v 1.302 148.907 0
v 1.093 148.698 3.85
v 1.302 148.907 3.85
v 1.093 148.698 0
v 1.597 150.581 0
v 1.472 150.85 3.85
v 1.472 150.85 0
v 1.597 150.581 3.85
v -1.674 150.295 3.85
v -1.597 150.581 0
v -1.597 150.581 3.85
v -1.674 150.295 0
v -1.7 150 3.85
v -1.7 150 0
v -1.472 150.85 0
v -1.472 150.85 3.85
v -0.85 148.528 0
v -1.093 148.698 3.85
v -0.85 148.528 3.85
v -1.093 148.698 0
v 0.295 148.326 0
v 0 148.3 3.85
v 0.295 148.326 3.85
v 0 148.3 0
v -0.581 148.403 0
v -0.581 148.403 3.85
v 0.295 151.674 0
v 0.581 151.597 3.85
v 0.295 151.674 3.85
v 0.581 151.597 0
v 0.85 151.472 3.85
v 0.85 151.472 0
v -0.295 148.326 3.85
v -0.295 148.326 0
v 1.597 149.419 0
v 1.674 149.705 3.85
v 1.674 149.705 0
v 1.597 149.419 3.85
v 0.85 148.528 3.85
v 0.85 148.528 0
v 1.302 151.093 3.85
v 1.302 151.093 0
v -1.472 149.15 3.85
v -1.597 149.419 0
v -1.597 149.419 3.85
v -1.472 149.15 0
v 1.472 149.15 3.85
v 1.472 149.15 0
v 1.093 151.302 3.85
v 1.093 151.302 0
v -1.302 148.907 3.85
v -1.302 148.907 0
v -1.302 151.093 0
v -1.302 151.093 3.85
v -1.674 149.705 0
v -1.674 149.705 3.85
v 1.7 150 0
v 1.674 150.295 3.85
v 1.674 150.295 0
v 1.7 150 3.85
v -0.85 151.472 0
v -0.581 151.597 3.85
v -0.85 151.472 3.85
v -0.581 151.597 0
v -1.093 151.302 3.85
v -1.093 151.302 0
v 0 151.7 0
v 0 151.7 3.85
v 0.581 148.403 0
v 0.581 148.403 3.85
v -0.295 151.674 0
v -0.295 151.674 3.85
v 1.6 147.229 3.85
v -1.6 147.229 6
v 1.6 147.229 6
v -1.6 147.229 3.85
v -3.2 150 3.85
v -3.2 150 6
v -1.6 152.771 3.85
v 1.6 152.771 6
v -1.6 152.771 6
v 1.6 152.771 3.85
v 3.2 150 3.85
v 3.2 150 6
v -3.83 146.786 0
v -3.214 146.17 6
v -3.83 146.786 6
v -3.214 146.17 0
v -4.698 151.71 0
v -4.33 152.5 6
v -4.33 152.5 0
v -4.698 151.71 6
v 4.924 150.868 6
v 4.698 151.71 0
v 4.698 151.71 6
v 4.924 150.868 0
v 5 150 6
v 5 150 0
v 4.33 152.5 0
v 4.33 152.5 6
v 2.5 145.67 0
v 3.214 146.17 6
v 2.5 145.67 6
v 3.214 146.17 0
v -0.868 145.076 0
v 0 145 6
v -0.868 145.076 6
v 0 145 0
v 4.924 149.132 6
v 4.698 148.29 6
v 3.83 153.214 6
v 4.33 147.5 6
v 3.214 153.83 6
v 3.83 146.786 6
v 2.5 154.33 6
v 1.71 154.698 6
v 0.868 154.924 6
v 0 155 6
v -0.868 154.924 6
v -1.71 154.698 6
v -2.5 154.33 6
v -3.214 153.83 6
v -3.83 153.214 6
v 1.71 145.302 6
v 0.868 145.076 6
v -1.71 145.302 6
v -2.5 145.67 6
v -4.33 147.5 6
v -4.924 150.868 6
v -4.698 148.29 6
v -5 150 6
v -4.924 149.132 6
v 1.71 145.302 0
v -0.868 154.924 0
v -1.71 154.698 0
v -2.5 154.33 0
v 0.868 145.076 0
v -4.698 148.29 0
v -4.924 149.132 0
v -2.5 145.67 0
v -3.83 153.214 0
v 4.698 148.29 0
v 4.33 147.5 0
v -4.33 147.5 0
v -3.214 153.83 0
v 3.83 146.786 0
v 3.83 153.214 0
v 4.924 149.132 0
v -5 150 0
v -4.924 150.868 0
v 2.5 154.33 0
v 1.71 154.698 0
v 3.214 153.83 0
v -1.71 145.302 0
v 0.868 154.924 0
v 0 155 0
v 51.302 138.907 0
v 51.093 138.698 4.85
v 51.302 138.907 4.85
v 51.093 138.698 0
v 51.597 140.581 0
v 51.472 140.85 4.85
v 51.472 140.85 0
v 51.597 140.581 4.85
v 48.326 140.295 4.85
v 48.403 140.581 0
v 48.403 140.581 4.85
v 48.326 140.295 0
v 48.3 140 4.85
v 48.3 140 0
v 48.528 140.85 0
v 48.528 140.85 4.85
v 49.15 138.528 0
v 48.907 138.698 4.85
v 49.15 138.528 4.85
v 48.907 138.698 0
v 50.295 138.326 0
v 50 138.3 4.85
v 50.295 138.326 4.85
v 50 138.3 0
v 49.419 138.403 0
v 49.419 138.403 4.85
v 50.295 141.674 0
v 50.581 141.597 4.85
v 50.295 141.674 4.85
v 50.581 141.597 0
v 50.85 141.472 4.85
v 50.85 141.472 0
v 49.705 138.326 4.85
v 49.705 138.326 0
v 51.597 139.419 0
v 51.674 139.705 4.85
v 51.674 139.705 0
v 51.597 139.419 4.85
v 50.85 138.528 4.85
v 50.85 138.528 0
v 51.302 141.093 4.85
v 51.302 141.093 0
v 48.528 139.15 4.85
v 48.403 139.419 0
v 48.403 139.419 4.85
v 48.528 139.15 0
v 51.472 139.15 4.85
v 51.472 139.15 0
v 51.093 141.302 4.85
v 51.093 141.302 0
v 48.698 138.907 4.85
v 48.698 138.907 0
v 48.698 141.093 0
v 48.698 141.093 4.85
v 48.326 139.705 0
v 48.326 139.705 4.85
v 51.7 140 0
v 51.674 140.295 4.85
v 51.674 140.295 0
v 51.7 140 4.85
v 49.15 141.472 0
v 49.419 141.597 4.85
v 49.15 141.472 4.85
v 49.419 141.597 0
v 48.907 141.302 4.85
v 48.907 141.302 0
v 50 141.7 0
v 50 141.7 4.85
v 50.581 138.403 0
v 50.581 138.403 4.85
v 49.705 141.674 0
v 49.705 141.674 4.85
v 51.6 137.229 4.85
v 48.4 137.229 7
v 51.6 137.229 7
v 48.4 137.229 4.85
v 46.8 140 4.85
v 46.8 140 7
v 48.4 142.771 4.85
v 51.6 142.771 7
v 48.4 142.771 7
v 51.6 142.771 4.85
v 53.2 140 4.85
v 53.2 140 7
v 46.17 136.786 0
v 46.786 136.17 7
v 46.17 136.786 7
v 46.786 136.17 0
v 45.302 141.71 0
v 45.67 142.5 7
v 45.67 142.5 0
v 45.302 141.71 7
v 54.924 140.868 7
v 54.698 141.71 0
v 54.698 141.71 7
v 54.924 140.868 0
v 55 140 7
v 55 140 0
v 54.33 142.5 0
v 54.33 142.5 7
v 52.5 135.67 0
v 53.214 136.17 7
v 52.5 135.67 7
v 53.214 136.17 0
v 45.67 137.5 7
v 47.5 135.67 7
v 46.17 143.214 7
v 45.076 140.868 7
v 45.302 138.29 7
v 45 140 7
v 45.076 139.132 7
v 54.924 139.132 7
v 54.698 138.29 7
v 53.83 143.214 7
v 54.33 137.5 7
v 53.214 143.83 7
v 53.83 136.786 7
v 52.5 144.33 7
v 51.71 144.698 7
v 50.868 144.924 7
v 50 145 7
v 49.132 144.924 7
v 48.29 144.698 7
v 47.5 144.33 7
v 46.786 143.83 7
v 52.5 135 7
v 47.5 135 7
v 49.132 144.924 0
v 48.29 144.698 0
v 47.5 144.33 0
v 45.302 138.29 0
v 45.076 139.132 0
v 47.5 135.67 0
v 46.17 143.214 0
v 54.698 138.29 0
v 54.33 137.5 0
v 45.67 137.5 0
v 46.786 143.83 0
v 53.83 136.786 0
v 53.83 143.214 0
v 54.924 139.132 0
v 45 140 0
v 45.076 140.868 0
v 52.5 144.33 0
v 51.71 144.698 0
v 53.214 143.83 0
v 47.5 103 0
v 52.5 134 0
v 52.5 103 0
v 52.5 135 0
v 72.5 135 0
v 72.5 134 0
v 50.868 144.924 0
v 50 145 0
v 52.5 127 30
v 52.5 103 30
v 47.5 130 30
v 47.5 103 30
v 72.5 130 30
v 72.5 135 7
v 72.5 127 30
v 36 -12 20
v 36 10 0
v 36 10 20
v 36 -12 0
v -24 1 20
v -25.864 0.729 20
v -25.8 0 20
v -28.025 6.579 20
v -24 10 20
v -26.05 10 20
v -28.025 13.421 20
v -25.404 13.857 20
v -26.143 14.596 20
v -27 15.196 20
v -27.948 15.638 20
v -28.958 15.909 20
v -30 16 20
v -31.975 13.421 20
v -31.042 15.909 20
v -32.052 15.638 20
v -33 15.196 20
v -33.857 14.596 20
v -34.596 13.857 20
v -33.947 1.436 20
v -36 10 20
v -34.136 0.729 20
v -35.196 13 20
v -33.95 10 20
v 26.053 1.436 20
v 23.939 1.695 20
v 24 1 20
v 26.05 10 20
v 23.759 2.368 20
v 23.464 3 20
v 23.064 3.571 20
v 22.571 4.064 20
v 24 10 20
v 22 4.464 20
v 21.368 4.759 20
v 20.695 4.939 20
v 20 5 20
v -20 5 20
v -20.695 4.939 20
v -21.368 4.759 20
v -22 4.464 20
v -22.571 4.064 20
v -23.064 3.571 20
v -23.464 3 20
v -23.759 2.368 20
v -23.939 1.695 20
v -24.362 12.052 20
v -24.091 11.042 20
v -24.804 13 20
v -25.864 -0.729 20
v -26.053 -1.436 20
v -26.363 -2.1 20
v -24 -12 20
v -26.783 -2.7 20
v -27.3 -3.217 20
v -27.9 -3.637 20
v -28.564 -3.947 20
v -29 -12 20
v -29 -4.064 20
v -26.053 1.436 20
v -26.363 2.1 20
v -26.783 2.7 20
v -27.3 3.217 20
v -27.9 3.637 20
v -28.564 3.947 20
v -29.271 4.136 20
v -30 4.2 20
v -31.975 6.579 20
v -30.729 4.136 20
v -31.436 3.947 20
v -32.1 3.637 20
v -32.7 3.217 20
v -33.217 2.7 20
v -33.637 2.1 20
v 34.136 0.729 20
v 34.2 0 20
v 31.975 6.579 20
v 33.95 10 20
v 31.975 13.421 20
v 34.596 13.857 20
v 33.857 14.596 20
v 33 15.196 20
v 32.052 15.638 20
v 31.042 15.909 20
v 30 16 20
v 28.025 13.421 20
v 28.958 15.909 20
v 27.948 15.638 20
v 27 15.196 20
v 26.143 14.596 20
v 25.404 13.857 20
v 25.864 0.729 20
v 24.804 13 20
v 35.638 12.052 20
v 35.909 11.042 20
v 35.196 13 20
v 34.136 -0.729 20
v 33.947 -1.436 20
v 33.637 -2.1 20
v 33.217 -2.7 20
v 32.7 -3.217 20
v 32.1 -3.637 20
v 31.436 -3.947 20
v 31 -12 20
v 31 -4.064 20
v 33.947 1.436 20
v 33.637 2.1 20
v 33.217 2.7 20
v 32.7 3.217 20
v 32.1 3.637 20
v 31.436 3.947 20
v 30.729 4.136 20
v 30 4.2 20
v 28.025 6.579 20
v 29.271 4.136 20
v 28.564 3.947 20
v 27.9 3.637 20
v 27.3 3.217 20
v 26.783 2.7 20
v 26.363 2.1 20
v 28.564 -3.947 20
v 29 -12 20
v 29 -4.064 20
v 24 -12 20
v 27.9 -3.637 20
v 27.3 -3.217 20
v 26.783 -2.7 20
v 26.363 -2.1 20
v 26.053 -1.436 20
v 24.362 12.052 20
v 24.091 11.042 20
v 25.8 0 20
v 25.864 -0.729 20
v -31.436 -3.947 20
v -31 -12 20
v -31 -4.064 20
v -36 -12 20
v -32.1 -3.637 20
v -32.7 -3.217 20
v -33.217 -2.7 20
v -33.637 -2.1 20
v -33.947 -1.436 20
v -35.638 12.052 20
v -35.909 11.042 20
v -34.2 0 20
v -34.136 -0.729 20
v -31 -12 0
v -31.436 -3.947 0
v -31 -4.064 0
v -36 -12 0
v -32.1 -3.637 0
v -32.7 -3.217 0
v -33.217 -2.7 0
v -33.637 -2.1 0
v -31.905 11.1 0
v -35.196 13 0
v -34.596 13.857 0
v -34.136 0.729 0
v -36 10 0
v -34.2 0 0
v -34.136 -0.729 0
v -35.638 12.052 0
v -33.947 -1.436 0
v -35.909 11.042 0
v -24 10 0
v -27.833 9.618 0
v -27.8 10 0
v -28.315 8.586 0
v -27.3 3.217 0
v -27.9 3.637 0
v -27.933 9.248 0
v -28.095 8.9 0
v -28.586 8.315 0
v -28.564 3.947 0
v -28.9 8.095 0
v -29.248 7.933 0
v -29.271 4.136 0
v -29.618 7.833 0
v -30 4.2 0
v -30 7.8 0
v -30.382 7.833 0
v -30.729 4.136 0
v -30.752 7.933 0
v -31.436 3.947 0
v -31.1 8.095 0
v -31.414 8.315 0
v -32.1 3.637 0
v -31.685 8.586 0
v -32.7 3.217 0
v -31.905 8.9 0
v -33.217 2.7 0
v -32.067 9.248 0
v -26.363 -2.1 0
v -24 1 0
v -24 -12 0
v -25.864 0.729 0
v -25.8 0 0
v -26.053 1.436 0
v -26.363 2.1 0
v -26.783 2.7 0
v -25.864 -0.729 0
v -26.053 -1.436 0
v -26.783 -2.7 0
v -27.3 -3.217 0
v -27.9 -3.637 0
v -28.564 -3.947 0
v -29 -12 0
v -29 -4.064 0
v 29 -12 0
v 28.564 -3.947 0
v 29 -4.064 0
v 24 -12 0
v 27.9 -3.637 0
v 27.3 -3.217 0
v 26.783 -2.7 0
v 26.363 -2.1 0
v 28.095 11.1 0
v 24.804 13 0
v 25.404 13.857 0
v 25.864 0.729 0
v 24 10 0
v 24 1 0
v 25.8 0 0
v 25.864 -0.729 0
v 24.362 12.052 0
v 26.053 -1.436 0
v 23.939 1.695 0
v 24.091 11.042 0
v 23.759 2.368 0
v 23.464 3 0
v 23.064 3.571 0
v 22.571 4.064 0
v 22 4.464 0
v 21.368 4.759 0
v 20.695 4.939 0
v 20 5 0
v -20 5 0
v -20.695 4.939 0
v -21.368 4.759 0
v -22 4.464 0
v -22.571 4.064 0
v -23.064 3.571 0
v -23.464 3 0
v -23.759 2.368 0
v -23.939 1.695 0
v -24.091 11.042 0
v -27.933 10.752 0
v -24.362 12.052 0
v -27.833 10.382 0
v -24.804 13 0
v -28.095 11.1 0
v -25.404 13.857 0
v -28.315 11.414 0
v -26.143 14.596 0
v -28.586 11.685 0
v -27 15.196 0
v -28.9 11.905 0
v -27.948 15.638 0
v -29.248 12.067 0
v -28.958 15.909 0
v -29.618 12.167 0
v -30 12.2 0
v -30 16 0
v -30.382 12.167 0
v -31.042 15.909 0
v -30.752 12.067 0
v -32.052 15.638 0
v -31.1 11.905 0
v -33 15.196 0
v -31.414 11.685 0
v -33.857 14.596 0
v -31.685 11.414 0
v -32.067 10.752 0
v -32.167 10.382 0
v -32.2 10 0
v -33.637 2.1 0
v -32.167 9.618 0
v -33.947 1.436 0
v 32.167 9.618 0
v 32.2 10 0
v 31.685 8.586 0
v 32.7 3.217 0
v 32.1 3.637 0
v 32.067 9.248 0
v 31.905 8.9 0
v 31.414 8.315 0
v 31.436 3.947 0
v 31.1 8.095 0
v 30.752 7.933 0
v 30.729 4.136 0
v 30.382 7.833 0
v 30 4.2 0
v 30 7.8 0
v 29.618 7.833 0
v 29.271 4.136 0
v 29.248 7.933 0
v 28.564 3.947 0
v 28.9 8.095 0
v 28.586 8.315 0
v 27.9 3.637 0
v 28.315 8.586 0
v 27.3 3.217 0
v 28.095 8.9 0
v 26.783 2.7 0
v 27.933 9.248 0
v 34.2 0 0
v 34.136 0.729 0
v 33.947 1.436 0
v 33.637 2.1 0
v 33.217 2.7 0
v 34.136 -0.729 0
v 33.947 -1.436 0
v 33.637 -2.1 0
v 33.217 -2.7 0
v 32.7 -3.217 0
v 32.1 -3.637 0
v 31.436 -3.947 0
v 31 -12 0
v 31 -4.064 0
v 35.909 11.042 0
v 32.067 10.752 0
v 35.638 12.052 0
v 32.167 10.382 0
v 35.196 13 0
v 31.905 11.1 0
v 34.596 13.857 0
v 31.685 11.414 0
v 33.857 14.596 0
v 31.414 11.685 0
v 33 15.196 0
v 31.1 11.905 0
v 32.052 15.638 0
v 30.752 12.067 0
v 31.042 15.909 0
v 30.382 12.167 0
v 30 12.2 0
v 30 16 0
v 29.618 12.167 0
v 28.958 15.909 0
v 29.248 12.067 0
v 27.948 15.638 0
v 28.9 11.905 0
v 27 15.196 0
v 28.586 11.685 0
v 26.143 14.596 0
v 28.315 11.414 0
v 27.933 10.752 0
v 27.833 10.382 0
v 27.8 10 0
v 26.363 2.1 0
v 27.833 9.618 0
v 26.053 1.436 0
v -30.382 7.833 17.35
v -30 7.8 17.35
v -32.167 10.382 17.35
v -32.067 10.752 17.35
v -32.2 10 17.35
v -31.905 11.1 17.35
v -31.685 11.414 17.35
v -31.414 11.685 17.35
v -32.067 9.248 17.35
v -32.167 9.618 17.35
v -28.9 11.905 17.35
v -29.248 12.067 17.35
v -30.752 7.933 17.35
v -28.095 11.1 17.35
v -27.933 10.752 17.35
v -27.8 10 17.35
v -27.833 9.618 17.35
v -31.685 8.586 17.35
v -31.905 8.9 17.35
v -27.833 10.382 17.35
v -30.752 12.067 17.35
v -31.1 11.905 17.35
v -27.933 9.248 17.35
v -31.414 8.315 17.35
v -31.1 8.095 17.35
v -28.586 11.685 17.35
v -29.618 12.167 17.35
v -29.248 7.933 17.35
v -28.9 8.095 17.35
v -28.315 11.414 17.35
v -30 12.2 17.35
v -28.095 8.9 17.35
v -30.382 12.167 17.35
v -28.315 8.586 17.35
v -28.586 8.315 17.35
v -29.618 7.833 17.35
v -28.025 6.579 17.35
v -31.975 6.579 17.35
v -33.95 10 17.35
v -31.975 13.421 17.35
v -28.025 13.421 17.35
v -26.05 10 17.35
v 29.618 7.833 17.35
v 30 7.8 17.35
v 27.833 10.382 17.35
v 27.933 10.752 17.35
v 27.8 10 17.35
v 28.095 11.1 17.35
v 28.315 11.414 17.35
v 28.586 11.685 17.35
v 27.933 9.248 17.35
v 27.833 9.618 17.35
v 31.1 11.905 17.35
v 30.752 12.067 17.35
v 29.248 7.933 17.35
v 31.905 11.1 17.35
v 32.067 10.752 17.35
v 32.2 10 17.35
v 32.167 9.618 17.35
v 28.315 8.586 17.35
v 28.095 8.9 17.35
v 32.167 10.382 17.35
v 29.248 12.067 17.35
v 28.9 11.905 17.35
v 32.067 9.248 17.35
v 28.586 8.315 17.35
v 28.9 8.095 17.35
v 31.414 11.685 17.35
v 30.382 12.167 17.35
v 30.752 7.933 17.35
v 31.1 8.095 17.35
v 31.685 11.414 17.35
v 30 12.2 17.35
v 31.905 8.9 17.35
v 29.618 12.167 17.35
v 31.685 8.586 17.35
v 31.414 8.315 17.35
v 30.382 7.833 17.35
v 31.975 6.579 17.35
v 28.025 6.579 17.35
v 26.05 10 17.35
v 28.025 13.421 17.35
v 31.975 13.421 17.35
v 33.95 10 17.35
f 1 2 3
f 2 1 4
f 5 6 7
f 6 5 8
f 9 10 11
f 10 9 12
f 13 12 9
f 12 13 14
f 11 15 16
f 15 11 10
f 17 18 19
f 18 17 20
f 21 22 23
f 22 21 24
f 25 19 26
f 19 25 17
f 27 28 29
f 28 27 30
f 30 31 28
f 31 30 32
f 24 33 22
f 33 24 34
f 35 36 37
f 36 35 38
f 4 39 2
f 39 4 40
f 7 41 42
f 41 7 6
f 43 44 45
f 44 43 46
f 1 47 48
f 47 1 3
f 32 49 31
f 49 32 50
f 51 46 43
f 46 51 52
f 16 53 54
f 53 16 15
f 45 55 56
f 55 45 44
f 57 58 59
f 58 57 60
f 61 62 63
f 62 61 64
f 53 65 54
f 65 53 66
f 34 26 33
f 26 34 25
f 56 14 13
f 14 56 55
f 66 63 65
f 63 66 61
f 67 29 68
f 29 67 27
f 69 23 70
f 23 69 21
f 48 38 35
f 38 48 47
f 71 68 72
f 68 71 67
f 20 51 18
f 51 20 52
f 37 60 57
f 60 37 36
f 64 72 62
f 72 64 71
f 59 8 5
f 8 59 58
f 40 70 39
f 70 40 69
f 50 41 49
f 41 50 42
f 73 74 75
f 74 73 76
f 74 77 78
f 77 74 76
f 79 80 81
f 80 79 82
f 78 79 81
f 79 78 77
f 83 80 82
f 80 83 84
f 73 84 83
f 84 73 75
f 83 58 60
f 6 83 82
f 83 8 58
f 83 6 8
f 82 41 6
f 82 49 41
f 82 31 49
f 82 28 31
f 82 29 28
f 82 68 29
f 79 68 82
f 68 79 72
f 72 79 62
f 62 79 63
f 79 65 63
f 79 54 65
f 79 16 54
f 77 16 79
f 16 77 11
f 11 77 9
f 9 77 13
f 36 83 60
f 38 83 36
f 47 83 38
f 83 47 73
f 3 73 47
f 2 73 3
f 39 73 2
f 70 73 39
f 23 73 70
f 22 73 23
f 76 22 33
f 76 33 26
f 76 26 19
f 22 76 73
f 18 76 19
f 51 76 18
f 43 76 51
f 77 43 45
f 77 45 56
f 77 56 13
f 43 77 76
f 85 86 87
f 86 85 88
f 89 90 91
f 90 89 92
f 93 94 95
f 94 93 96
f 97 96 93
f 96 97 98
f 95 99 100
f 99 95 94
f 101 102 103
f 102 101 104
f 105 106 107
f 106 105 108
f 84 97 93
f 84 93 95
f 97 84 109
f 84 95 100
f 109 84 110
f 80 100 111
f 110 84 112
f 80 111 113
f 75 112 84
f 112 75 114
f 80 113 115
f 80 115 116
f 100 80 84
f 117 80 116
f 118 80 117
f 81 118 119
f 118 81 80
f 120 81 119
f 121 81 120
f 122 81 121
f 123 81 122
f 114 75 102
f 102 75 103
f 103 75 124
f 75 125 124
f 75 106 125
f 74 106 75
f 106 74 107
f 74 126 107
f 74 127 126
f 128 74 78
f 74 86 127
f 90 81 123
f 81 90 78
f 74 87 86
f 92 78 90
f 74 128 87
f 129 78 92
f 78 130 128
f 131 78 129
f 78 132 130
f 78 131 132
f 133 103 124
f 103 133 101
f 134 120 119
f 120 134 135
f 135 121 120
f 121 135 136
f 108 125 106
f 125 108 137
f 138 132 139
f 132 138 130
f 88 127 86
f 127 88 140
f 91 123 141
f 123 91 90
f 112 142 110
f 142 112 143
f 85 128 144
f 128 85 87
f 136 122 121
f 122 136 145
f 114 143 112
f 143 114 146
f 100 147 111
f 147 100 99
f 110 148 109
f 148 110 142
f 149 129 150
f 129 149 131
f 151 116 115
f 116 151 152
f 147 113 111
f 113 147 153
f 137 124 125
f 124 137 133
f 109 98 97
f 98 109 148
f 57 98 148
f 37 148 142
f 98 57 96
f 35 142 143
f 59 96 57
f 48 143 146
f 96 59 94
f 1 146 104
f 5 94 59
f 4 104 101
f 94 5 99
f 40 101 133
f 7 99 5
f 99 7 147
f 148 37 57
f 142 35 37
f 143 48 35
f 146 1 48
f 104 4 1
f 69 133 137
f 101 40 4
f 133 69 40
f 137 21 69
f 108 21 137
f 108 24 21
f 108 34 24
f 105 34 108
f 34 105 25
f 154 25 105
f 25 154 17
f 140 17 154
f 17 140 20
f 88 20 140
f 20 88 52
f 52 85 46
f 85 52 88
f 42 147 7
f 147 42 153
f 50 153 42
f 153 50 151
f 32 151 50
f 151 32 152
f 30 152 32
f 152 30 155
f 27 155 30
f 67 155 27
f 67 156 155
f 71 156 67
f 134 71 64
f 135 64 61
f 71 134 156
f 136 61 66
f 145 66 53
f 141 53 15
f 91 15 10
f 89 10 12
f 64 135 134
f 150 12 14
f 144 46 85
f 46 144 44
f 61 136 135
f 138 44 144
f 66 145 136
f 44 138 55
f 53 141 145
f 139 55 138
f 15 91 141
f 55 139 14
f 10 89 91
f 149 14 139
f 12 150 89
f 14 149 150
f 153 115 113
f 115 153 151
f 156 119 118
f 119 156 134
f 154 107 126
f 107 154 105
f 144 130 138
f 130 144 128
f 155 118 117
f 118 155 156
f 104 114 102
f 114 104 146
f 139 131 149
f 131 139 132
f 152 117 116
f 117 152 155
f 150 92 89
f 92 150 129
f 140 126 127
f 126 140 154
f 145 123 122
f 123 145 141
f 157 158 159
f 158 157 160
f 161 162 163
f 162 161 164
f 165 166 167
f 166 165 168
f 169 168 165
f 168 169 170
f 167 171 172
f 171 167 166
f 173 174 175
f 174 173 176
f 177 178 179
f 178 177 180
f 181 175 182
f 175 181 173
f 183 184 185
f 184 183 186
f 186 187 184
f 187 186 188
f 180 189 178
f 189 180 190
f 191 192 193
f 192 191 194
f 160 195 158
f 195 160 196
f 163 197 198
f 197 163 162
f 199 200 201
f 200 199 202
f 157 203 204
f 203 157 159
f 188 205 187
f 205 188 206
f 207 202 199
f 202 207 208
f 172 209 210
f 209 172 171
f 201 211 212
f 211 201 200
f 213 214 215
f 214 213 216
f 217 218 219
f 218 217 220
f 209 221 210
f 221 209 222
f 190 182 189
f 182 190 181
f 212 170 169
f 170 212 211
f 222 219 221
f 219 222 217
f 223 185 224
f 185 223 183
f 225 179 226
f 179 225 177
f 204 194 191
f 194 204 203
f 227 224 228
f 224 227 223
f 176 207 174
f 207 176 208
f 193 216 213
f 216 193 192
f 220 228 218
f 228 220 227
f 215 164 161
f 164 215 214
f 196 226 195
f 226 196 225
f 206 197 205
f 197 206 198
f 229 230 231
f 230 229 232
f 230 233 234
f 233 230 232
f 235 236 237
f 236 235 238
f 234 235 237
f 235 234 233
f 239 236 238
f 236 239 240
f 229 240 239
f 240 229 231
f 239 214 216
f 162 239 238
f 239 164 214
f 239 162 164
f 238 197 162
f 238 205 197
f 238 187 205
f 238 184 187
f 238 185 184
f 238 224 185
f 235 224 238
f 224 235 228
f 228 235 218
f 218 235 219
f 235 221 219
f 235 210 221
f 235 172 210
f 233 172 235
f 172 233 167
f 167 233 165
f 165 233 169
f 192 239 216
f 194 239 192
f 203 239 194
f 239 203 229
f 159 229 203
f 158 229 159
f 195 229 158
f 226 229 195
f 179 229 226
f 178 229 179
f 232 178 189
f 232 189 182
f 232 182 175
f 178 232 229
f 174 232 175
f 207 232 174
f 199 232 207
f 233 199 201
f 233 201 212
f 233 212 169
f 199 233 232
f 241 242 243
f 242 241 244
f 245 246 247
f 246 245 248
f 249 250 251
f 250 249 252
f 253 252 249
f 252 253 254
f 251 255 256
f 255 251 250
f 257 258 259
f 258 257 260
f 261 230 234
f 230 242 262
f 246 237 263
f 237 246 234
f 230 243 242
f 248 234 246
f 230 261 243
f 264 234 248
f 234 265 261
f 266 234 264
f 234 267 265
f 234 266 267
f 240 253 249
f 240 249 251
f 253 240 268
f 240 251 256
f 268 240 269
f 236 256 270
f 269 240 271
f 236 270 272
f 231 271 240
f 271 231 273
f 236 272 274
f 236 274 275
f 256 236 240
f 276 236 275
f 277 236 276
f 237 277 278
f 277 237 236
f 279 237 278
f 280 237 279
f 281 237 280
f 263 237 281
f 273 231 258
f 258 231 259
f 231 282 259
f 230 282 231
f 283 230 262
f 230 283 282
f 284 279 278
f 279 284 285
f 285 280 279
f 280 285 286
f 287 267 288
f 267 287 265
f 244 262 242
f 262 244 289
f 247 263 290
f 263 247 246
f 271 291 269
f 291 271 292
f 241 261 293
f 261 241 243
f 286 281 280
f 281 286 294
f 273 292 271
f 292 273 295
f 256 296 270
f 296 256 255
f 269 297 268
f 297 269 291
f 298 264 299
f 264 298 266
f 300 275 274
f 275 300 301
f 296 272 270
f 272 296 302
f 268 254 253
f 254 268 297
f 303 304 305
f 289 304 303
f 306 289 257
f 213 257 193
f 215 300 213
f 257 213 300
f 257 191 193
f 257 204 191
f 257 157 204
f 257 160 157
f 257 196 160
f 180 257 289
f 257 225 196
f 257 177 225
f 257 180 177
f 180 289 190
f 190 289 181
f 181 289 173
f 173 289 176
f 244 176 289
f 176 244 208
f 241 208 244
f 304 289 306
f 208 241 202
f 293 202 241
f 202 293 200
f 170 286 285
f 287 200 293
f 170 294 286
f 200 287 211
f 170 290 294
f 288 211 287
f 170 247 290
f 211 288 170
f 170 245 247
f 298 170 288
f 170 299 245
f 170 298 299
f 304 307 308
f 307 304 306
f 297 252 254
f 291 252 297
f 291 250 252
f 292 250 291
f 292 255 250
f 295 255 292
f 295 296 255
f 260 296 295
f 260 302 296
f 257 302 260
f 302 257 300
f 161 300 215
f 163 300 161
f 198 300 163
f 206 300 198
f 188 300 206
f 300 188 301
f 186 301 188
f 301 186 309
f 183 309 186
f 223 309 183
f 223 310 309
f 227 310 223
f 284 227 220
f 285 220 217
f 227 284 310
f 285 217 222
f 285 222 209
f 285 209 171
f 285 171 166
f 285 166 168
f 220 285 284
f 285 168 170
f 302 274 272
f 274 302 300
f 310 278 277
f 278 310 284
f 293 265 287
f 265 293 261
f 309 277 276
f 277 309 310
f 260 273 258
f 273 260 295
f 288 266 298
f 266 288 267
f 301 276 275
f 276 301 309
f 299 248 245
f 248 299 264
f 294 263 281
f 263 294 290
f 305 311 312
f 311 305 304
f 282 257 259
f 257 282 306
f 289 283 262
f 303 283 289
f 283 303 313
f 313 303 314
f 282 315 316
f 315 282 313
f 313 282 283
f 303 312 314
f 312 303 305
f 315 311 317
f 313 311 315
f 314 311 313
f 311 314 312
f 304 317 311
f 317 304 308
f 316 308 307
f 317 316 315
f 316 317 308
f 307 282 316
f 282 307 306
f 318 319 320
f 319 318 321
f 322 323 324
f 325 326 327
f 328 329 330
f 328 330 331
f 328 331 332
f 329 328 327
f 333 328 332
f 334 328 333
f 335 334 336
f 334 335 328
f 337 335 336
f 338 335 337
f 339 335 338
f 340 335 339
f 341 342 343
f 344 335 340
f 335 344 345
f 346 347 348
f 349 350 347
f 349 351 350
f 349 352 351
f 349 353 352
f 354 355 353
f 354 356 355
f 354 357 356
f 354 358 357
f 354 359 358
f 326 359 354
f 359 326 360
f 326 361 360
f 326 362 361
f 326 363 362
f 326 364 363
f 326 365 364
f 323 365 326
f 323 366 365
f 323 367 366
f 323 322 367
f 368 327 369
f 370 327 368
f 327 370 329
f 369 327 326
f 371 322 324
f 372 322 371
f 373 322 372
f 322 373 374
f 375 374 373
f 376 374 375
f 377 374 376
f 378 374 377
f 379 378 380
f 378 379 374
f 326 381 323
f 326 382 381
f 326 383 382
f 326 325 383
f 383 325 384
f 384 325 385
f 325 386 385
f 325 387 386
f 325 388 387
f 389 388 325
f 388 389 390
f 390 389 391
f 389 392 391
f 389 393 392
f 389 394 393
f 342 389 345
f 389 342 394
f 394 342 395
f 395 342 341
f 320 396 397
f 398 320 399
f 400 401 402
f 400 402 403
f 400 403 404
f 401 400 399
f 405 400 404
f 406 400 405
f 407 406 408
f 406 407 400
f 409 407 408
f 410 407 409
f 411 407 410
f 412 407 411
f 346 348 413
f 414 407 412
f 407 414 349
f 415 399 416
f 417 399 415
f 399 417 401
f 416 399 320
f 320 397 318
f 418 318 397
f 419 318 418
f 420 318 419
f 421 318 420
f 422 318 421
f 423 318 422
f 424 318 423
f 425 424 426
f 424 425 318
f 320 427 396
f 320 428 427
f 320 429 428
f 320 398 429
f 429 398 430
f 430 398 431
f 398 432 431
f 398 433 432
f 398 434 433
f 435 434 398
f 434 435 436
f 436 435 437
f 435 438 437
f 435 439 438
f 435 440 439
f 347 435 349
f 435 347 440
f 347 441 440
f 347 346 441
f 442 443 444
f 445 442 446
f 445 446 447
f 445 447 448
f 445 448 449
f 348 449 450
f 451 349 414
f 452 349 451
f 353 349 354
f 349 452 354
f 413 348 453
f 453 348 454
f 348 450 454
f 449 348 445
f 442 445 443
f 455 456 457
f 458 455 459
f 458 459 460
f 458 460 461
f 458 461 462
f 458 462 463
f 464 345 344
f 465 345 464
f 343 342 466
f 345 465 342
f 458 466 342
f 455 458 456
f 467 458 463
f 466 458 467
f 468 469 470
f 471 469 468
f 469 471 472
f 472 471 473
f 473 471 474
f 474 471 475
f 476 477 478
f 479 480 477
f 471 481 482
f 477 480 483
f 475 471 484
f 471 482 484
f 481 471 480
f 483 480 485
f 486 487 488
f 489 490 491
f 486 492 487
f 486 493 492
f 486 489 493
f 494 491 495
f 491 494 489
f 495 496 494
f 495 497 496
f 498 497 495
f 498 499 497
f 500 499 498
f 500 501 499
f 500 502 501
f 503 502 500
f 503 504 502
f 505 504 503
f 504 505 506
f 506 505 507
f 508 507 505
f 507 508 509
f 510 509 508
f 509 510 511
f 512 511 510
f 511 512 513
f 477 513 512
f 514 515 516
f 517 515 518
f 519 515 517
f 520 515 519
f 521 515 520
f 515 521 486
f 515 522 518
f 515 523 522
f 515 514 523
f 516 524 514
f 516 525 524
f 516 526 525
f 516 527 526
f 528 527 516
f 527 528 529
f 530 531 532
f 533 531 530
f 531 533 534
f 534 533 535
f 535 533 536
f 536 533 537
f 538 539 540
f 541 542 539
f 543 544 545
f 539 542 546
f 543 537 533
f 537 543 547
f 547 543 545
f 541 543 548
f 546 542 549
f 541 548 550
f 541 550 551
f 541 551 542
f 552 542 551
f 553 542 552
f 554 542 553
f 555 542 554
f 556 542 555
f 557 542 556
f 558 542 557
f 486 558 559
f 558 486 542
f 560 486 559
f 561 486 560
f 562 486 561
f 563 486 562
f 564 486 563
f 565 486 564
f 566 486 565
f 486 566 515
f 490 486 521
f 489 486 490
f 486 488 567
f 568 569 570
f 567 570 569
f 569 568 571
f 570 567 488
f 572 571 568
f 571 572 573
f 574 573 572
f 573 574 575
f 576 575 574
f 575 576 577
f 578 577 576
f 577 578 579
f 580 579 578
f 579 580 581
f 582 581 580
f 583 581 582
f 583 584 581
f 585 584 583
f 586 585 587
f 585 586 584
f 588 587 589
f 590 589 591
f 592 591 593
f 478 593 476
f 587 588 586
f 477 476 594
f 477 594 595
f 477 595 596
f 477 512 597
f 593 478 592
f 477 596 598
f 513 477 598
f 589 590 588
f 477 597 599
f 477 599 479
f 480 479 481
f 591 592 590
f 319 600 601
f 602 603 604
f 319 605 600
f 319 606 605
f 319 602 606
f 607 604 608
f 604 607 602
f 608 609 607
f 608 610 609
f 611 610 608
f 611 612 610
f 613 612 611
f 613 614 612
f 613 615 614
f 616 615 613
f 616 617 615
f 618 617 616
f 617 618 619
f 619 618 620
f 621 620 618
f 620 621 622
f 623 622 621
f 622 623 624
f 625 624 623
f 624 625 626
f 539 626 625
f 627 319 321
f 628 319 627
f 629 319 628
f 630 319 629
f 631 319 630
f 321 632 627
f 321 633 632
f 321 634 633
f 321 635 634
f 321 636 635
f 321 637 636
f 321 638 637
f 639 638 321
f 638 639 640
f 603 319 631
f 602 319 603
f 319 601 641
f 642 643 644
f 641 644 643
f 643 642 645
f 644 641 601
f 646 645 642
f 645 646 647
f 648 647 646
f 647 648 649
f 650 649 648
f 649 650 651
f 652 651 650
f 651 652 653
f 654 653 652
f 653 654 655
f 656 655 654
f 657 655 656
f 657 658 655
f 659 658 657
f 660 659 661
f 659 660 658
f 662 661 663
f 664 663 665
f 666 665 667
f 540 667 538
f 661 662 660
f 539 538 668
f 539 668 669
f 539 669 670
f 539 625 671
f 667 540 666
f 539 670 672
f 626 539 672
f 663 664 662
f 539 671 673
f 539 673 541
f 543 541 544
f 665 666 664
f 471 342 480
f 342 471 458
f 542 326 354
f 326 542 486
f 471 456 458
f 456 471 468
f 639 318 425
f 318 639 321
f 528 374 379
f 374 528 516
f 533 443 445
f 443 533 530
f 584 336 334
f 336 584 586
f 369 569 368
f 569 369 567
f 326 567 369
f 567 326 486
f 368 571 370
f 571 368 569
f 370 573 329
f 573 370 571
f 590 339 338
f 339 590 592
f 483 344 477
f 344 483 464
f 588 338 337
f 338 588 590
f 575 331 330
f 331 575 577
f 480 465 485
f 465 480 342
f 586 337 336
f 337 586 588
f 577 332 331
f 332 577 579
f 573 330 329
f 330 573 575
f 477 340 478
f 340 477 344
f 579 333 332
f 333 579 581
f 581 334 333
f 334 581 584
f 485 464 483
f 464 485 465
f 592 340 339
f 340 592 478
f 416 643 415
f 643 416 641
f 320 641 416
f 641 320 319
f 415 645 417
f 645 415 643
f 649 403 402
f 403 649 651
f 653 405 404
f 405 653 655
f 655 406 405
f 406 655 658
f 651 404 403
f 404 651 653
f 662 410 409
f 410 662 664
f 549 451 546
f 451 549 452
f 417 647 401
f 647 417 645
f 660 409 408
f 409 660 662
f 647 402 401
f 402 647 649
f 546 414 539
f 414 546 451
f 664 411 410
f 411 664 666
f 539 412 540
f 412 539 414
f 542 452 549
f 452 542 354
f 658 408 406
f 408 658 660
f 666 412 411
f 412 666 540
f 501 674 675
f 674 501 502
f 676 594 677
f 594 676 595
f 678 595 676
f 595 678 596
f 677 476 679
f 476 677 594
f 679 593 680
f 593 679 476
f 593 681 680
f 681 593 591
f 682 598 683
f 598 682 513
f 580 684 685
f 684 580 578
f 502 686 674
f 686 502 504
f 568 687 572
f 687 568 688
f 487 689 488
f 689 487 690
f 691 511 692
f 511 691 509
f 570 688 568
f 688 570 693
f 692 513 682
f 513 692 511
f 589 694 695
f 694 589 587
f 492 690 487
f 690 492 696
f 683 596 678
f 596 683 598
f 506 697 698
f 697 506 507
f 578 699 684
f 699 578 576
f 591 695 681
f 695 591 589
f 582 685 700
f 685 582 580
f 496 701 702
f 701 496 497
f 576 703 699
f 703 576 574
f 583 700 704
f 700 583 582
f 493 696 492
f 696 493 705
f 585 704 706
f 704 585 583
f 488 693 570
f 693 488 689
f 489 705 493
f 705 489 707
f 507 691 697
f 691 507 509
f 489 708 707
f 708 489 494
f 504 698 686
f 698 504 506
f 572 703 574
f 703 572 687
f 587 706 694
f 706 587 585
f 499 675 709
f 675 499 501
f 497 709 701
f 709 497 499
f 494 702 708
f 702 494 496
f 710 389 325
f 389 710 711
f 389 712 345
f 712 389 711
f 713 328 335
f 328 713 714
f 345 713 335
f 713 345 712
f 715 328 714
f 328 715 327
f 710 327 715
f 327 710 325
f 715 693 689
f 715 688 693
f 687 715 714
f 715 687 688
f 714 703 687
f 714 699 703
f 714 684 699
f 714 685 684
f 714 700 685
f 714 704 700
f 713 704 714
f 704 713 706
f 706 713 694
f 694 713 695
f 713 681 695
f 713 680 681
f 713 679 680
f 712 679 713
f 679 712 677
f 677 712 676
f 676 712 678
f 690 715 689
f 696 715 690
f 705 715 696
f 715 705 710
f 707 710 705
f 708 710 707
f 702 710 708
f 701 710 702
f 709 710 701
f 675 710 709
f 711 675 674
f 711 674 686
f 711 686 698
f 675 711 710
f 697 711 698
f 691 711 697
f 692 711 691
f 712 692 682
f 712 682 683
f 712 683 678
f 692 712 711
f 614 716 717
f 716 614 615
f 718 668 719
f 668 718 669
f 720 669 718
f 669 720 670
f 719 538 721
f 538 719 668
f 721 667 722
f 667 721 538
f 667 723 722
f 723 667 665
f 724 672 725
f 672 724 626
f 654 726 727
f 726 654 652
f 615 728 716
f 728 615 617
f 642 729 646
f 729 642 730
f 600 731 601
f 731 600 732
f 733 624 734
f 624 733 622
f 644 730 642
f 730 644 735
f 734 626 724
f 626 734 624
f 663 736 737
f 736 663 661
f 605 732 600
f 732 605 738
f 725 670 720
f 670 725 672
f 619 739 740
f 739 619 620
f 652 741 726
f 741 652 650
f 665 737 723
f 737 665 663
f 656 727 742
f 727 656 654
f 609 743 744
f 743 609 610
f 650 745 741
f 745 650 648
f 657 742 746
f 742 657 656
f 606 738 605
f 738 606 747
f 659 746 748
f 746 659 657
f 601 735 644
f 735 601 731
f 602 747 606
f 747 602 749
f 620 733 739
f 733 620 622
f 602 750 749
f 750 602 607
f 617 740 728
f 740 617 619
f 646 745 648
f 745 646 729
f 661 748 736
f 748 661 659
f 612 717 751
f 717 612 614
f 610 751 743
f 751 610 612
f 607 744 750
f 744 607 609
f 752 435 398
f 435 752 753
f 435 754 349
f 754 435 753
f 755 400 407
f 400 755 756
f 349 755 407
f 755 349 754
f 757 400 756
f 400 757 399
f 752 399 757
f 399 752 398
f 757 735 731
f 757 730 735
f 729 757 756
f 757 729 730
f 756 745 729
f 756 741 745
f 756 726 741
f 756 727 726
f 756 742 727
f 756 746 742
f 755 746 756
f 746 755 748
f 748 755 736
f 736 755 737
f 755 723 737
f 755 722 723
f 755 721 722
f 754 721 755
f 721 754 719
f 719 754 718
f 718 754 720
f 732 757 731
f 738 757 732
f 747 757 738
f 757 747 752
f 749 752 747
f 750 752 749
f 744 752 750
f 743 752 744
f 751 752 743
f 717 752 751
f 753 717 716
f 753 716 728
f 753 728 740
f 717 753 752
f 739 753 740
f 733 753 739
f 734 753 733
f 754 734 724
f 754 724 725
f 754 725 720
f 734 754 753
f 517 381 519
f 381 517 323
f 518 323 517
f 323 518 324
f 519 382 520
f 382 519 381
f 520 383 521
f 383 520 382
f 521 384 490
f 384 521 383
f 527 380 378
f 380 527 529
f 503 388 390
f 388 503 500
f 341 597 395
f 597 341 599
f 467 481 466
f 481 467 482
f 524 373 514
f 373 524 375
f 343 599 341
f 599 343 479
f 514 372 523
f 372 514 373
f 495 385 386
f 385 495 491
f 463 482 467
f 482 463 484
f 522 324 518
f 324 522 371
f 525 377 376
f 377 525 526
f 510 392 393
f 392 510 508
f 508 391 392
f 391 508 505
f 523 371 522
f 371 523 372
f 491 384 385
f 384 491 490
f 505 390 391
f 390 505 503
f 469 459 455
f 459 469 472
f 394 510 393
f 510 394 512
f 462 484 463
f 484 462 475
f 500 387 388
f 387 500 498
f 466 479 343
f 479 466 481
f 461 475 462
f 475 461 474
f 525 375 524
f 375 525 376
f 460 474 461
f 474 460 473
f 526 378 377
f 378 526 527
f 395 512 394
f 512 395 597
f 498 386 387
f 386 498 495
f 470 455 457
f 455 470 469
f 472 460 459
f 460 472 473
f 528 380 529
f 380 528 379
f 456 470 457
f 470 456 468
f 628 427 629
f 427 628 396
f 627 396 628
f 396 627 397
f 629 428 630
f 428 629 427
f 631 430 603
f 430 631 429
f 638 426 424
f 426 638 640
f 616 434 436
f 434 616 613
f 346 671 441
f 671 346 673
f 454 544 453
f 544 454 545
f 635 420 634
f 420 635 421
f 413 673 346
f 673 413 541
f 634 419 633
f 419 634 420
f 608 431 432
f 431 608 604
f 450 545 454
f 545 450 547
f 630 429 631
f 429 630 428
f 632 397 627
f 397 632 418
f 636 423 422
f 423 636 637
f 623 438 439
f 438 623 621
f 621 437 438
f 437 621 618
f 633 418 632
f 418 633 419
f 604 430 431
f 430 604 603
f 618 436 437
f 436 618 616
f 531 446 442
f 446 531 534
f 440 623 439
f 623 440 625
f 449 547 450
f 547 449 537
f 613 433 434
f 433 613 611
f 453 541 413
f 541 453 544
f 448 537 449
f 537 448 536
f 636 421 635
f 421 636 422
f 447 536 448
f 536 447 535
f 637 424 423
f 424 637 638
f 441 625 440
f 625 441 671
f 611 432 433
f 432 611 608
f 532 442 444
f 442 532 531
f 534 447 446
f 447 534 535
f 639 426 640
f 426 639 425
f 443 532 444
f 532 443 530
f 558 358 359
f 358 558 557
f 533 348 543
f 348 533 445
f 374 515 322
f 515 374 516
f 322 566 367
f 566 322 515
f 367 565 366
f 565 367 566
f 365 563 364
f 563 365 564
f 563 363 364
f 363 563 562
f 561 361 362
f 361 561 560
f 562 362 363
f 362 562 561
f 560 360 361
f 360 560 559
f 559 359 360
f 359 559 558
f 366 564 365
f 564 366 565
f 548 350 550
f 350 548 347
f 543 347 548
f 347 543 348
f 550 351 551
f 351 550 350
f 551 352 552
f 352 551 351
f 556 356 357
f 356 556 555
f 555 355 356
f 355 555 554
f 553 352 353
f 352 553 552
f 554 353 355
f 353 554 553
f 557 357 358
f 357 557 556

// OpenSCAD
// file: prism.scad
// Vibe coded by co-pilot
// Linear_extrude breaks FreeCAD when imported, so instead unfold into 
// polyhedrons for generating solids from points
//
// Robust prism() module for OpenSCAD
// - auto-corrects polygon winding
// - generates manifold polyhedron
//
// prism(points, height)
// Robust polyhedron-based prism generator for OpenSCAD.
// - No sum()
// - No reverse()
// - Auto-corrects polygon winding
// - Produces manifold geometry
//

module prism(points, height, center=false) {

    // Compute signed area manually (shoelace formula)
    function signed_area(pts, i = 0, acc = 0) =
        i == len(pts)
        ? acc / 2
        : let(
            j = (i + 1) % len(pts),
            term = pts[i][0] * pts[j][1] - pts[j][0] * pts[i][1]
        )
        signed_area(pts, i + 1, acc + term);

    // Ensure CCW winding
    ccw = signed_area(points) > 0;
    pts = ccw ? points : [ for (i = [len(points)-1 : -1 : 0]) points[i] ];

    n = len(pts);

    // Build bottom and top vertices
    bottom = [ for (p = pts) [p[0], p[1], 0] ];
    top    = [ for (p = pts) [p[0], p[1], height] ];

    verts = concat(bottom, top);

    // Bottom face (CCW)
    bottom_face = [ for (i = [0 : n-1]) i ];

    // Top face (CCW when viewed from above)
    top_face = [ for (i = [0 : n-1]) (2*n - 1 - i) ];

    // Side faces (quads)
    side_faces = [
        for (i = [0 : n-1]) [
            i,
            (i+1) % n,
            n + (i+1) % n,
            n + i
        ]
    ];
    if(center) translate([0,0,-height/2])
    polyhedron(
        points = verts,
        faces = concat(
            [bottom_face],
            [top_face],
            side_faces
        )
    );
    else 
    polyhedron(
        points = verts,
        faces = concat(
            [bottom_face],
            [top_face],
            side_faces
        )
    );
}
// file: misc_parts.scad
/*
Info: 
This lib contains things like screws, nuts and bearings.

Improvement:
- wasn't there before

TODO: 
- differentiate between parts that get substracted and normal parts (different diameters)

*/

include <misc_parts_inc.scad>

module screw_M3(length) 
{
    cylinder(d=M3_screw_hole_dia, h=length);
	cylinder(d=M3_nut_hole_dia, h=2.3, center=true, $fn=6);
}
screw_M3(10);

module screw_M4(length) 
{
    cylinder(d=M4_screw_hole_dia, h=length);
	cylinder(d=M4_nut_hole_dia, h=3.3, center=true, $fn=6);
}
translate([0,10,0]) screw_M4(10);

module screw_M5(length) 
{
    cylinder(d=M5_screw_hole_dia, h=length);
	cylinder(d=M5_nut_hole_dia, h=4.0, center=true, $fn=6);
}

translate([20,10,0]) screw_M5(10);

// Bearing - inner Diameter, outer diameter, width
module bearing(ID,OD,W) 
{
    translate([0,0,W/2]) difference() 
    {
        cylinder(d=OD, h=W, center=true);
        cylinder(d=ID, h=W+1, center=true);
    }
}
translate([0,30,0]) bearing(5,16,5);


// unregular cube
// 4 of the 12 edges are rounded
module round_cuboid(x,y,z,r,$fn=48) 
{
    cube([x,y-2*r,z],center=true);
    cube([x-2*r,y,z],center=true);
    cube([x-2*r,y-2*r,z],center=true);
    
    translate([+x/2-r,+y/2-r,0]) cylinder(r=r,h=z,center=true);
    translate([+x/2-r,-y/2+r,0]) cylinder(r=r,h=z,center=true);
    translate([-x/2+r,+y/2-r,0]) cylinder(r=r,h=z,center=true);
    translate([-x/2+r,-y/2+r,0]) cylinder(r=r,h=z,center=true);
}   
translate([0,50,0]) round_cuboid(x=19,y=10,z=30,r=3);

// unregular cube
// all 12 edges are rounded
module round_cuboid3(x,y,z,r,$fn=48) 
{
    cube([x,y-2*r,z-2*r],center=true);
    cube([x-2*r,y,z-2*r],center=true);
    cube([x-2*r,y-2*r,z],center=true);
    
    translate([+x/2-r,+y/2-r,0]) cylinder(r=r,h=z-2*r,center=true);
    translate([+x/2-r,-y/2+r,0]) cylinder(r=r,h=z-2*r,center=true);
    translate([-x/2+r,+y/2-r,0]) cylinder(r=r,h=z-2*r,center=true);
    translate([-x/2+r,-y/2+r,0]) cylinder(r=r,h=z-2*r,center=true);

    translate([+x/2-r,0,+z/2-r]) rotate([90,0,0]) cylinder(r=r,h=y-2*r,center=true);
    translate([+x/2-r,0,-z/2+r]) rotate([90,0,0]) cylinder(r=r,h=y-2*r,center=true);
    translate([-x/2+r,0,+z/2-r]) rotate([90,0,0]) cylinder(r=r,h=y-2*r,center=true);
    translate([-x/2+r,0,-z/2+r]) rotate([90,0,0]) cylinder(r=r,h=y-2*r,center=true);
    
    translate([0,+y/2-r,+z/2-r]) rotate([0,90,0]) cylinder(r=r,h=x-2*r,center=true);
    translate([0,+y/2-r,-z/2+r]) rotate([0,90,0]) cylinder(r=r,h=x-2*r,center=true);
    translate([0,-y/2+r,+z/2-r]) rotate([0,90,0]) cylinder(r=r,h=x-2*r,center=true);
    translate([0,-y/2+r,-z/2+r]) rotate([0,90,0]) cylinder(r=r,h=x-2*r,center=true);
    
    translate([+(x/2-r),+(y/2-r),+(z/2-r)]) sphere(r=r);
    translate([+(x/2-r),+(y/2-r),-(z/2-r)]) sphere(r=r);
    translate([+(x/2-r),-(y/2-r),+(z/2-r)]) sphere(r=r);
    translate([+(x/2-r),-(y/2-r),-(z/2-r)]) sphere(r=r);
    translate([-(x/2-r),+(y/2-r),+(z/2-r)]) sphere(r=r);
    translate([-(x/2-r),+(y/2-r),-(z/2-r)]) sphere(r=r);
    translate([-(x/2-r),-(y/2-r),+(z/2-r)]) sphere(r=r);
    translate([-(x/2-r),-(y/2-r),-(z/2-r)]) sphere(r=r);
}

translate([0,70,0]) round_cuboid3(20,10,15,2);
// file: misc_parts_inc.scad
M3_screw_hole_dia = 3.4;
M3_nut_hole_dia   = 6.2+0.2;

M4_screw_hole_dia = 4.4;
M4_nut_hole_dia   = 7.7+0.2;

M5_screw_hole_dia = 5.4;
M5_nut_hole_dia   = 9.0+0.9;
// file: bracket_inc.scad
rod_distance    = 60; // Smooth rod distance (center to center)
rod_hole_radius = 8.4/2;
// main file
/* 
Info: 
This part is just a template for the other parts of the linear drive.

Improvement: 
- diagonal fin is parametrised and reusable
- remove screw-models --> put in misc-parts

TODO: 
- 
*/

$fn = 36;
$fa = 12;
$fs = 0.5;

include <bracket_inc.scad>
include <misc_parts_inc.scad>
use <misc_parts.scad>


//// fin-module
// height1: front of fin
// height2: back of fin
// length1: length all together
// length2: length of the fin-part that gets merged in the adjacent part
// width:   ....
use <prism.scad>
module diagonal_fin2(height1, height2, length1, length2, width) 
{
    ds = 3; // =y0, distance from the endpoints
    y1 = (length1-length2)/2;
    y2 = (length1+length2)/2;
    y3 = length1 - ds;
    surface = [ [0,ds], [height1,ds], [height1,y1], [height2,y2], [height2,y3], [0,y3] ];
    union() 
    {
        rotate([0,-90,0]) prism(surface,width,center=true);
        // mounting screw hole.
        translate([0, length1, height2/2]) difference() 
        {
            cylinder(r=5, h=height2, center=true);
            translate([0,0,height2/2-1]) rotate([0,180,0]) screw_M3(10); 
        }
   }
}

translate([0,100,0]) diagonal_fin2(40, 6, 50, 40, 5);

module diagonal_fin3(height1, height2, length1, length2,length3, width,width2) 
{
    ds = 3; // =y0, distance from the endpoints
    y1 = (length1-length2)/2;
    y2 = (length1+length2)/2;
    y3 = length1 - ds;
    surface = [ [0,ds], [height1,ds], [height1,y1], [height1,30],
    [height2,y2], [height2,y3], [0,y3] ];
    wall_surface = [ [0,y3-length3], [height1,30-length3], [
    height1,30], [height2,y2], [0,y2] ];
    union() 
    {
        rotate([0,-90,0]) linear_extrude(width,center=true) polygon(points=surface);  
        translate([width2/2+width/2,0,0]) rotate([0,-90,0]) linear_extrude(width2,center=true) polygon(points=wall_surface);
        // mounting screw hole.
        translate([0, length1, height2/2]) difference() 
        {
            cylinder(r=5, h=height2, center=true);
            translate([0,0,height2/2-1]) rotate([0,180,0]) screw_M3(10); 
        }
   }
   echo(y1);
   echo(y2);
   echo(y3);
}

translate([50,100,0]) diagonal_fin3(30,7,40,30,3.0,5,20);

module bracket(height) 
{
    w = rod_distance;
    difference() 
    {
        union() 
        {
            translate([0, -1, 0]) cube([w+12, 22, height], center=true);
            // Sandwich mount hull
            translate([-w/2, 10, 0]) cylinder(r=6, h=height, center=true);
            translate([+w/2, 10, 0]) cylinder(r=6, h=height, center=true);
        }
        // Sandwich mount screw holes
        translate([-w/2, 10, height/2-1]) rotate([0,180,0]) screw_M4(height);
        translate([+w/2, 10, height/2-1]) rotate([0,180,0]) screw_M4(height);

        // Smooth rod mounting slots.
        for (x = [-w/2, w/2])
        {
            translate([x, 0, 0]) 
            {
                cylinder(r=rod_hole_radius, h=height+1, center=true);
                translate([0, -10, 0]) cube([2, 20, height+1], center=true);
            }
        }
        // Belt path.
        translate([0, -5, 0]) cube([w-20, 20, height+1], center=true);
        translate([0, -9, 0]) cube([w-12, 20, height+1], center=true);
        translate([-w/2+10, 1, 0]) cylinder(r=4, h=height+1, center=true);
        translate([+w/2-10, 1, 0]) cylinder(r=4, h=height+1, center=true);
    }
}

translate([0, 0, 10]) bracket(20);
